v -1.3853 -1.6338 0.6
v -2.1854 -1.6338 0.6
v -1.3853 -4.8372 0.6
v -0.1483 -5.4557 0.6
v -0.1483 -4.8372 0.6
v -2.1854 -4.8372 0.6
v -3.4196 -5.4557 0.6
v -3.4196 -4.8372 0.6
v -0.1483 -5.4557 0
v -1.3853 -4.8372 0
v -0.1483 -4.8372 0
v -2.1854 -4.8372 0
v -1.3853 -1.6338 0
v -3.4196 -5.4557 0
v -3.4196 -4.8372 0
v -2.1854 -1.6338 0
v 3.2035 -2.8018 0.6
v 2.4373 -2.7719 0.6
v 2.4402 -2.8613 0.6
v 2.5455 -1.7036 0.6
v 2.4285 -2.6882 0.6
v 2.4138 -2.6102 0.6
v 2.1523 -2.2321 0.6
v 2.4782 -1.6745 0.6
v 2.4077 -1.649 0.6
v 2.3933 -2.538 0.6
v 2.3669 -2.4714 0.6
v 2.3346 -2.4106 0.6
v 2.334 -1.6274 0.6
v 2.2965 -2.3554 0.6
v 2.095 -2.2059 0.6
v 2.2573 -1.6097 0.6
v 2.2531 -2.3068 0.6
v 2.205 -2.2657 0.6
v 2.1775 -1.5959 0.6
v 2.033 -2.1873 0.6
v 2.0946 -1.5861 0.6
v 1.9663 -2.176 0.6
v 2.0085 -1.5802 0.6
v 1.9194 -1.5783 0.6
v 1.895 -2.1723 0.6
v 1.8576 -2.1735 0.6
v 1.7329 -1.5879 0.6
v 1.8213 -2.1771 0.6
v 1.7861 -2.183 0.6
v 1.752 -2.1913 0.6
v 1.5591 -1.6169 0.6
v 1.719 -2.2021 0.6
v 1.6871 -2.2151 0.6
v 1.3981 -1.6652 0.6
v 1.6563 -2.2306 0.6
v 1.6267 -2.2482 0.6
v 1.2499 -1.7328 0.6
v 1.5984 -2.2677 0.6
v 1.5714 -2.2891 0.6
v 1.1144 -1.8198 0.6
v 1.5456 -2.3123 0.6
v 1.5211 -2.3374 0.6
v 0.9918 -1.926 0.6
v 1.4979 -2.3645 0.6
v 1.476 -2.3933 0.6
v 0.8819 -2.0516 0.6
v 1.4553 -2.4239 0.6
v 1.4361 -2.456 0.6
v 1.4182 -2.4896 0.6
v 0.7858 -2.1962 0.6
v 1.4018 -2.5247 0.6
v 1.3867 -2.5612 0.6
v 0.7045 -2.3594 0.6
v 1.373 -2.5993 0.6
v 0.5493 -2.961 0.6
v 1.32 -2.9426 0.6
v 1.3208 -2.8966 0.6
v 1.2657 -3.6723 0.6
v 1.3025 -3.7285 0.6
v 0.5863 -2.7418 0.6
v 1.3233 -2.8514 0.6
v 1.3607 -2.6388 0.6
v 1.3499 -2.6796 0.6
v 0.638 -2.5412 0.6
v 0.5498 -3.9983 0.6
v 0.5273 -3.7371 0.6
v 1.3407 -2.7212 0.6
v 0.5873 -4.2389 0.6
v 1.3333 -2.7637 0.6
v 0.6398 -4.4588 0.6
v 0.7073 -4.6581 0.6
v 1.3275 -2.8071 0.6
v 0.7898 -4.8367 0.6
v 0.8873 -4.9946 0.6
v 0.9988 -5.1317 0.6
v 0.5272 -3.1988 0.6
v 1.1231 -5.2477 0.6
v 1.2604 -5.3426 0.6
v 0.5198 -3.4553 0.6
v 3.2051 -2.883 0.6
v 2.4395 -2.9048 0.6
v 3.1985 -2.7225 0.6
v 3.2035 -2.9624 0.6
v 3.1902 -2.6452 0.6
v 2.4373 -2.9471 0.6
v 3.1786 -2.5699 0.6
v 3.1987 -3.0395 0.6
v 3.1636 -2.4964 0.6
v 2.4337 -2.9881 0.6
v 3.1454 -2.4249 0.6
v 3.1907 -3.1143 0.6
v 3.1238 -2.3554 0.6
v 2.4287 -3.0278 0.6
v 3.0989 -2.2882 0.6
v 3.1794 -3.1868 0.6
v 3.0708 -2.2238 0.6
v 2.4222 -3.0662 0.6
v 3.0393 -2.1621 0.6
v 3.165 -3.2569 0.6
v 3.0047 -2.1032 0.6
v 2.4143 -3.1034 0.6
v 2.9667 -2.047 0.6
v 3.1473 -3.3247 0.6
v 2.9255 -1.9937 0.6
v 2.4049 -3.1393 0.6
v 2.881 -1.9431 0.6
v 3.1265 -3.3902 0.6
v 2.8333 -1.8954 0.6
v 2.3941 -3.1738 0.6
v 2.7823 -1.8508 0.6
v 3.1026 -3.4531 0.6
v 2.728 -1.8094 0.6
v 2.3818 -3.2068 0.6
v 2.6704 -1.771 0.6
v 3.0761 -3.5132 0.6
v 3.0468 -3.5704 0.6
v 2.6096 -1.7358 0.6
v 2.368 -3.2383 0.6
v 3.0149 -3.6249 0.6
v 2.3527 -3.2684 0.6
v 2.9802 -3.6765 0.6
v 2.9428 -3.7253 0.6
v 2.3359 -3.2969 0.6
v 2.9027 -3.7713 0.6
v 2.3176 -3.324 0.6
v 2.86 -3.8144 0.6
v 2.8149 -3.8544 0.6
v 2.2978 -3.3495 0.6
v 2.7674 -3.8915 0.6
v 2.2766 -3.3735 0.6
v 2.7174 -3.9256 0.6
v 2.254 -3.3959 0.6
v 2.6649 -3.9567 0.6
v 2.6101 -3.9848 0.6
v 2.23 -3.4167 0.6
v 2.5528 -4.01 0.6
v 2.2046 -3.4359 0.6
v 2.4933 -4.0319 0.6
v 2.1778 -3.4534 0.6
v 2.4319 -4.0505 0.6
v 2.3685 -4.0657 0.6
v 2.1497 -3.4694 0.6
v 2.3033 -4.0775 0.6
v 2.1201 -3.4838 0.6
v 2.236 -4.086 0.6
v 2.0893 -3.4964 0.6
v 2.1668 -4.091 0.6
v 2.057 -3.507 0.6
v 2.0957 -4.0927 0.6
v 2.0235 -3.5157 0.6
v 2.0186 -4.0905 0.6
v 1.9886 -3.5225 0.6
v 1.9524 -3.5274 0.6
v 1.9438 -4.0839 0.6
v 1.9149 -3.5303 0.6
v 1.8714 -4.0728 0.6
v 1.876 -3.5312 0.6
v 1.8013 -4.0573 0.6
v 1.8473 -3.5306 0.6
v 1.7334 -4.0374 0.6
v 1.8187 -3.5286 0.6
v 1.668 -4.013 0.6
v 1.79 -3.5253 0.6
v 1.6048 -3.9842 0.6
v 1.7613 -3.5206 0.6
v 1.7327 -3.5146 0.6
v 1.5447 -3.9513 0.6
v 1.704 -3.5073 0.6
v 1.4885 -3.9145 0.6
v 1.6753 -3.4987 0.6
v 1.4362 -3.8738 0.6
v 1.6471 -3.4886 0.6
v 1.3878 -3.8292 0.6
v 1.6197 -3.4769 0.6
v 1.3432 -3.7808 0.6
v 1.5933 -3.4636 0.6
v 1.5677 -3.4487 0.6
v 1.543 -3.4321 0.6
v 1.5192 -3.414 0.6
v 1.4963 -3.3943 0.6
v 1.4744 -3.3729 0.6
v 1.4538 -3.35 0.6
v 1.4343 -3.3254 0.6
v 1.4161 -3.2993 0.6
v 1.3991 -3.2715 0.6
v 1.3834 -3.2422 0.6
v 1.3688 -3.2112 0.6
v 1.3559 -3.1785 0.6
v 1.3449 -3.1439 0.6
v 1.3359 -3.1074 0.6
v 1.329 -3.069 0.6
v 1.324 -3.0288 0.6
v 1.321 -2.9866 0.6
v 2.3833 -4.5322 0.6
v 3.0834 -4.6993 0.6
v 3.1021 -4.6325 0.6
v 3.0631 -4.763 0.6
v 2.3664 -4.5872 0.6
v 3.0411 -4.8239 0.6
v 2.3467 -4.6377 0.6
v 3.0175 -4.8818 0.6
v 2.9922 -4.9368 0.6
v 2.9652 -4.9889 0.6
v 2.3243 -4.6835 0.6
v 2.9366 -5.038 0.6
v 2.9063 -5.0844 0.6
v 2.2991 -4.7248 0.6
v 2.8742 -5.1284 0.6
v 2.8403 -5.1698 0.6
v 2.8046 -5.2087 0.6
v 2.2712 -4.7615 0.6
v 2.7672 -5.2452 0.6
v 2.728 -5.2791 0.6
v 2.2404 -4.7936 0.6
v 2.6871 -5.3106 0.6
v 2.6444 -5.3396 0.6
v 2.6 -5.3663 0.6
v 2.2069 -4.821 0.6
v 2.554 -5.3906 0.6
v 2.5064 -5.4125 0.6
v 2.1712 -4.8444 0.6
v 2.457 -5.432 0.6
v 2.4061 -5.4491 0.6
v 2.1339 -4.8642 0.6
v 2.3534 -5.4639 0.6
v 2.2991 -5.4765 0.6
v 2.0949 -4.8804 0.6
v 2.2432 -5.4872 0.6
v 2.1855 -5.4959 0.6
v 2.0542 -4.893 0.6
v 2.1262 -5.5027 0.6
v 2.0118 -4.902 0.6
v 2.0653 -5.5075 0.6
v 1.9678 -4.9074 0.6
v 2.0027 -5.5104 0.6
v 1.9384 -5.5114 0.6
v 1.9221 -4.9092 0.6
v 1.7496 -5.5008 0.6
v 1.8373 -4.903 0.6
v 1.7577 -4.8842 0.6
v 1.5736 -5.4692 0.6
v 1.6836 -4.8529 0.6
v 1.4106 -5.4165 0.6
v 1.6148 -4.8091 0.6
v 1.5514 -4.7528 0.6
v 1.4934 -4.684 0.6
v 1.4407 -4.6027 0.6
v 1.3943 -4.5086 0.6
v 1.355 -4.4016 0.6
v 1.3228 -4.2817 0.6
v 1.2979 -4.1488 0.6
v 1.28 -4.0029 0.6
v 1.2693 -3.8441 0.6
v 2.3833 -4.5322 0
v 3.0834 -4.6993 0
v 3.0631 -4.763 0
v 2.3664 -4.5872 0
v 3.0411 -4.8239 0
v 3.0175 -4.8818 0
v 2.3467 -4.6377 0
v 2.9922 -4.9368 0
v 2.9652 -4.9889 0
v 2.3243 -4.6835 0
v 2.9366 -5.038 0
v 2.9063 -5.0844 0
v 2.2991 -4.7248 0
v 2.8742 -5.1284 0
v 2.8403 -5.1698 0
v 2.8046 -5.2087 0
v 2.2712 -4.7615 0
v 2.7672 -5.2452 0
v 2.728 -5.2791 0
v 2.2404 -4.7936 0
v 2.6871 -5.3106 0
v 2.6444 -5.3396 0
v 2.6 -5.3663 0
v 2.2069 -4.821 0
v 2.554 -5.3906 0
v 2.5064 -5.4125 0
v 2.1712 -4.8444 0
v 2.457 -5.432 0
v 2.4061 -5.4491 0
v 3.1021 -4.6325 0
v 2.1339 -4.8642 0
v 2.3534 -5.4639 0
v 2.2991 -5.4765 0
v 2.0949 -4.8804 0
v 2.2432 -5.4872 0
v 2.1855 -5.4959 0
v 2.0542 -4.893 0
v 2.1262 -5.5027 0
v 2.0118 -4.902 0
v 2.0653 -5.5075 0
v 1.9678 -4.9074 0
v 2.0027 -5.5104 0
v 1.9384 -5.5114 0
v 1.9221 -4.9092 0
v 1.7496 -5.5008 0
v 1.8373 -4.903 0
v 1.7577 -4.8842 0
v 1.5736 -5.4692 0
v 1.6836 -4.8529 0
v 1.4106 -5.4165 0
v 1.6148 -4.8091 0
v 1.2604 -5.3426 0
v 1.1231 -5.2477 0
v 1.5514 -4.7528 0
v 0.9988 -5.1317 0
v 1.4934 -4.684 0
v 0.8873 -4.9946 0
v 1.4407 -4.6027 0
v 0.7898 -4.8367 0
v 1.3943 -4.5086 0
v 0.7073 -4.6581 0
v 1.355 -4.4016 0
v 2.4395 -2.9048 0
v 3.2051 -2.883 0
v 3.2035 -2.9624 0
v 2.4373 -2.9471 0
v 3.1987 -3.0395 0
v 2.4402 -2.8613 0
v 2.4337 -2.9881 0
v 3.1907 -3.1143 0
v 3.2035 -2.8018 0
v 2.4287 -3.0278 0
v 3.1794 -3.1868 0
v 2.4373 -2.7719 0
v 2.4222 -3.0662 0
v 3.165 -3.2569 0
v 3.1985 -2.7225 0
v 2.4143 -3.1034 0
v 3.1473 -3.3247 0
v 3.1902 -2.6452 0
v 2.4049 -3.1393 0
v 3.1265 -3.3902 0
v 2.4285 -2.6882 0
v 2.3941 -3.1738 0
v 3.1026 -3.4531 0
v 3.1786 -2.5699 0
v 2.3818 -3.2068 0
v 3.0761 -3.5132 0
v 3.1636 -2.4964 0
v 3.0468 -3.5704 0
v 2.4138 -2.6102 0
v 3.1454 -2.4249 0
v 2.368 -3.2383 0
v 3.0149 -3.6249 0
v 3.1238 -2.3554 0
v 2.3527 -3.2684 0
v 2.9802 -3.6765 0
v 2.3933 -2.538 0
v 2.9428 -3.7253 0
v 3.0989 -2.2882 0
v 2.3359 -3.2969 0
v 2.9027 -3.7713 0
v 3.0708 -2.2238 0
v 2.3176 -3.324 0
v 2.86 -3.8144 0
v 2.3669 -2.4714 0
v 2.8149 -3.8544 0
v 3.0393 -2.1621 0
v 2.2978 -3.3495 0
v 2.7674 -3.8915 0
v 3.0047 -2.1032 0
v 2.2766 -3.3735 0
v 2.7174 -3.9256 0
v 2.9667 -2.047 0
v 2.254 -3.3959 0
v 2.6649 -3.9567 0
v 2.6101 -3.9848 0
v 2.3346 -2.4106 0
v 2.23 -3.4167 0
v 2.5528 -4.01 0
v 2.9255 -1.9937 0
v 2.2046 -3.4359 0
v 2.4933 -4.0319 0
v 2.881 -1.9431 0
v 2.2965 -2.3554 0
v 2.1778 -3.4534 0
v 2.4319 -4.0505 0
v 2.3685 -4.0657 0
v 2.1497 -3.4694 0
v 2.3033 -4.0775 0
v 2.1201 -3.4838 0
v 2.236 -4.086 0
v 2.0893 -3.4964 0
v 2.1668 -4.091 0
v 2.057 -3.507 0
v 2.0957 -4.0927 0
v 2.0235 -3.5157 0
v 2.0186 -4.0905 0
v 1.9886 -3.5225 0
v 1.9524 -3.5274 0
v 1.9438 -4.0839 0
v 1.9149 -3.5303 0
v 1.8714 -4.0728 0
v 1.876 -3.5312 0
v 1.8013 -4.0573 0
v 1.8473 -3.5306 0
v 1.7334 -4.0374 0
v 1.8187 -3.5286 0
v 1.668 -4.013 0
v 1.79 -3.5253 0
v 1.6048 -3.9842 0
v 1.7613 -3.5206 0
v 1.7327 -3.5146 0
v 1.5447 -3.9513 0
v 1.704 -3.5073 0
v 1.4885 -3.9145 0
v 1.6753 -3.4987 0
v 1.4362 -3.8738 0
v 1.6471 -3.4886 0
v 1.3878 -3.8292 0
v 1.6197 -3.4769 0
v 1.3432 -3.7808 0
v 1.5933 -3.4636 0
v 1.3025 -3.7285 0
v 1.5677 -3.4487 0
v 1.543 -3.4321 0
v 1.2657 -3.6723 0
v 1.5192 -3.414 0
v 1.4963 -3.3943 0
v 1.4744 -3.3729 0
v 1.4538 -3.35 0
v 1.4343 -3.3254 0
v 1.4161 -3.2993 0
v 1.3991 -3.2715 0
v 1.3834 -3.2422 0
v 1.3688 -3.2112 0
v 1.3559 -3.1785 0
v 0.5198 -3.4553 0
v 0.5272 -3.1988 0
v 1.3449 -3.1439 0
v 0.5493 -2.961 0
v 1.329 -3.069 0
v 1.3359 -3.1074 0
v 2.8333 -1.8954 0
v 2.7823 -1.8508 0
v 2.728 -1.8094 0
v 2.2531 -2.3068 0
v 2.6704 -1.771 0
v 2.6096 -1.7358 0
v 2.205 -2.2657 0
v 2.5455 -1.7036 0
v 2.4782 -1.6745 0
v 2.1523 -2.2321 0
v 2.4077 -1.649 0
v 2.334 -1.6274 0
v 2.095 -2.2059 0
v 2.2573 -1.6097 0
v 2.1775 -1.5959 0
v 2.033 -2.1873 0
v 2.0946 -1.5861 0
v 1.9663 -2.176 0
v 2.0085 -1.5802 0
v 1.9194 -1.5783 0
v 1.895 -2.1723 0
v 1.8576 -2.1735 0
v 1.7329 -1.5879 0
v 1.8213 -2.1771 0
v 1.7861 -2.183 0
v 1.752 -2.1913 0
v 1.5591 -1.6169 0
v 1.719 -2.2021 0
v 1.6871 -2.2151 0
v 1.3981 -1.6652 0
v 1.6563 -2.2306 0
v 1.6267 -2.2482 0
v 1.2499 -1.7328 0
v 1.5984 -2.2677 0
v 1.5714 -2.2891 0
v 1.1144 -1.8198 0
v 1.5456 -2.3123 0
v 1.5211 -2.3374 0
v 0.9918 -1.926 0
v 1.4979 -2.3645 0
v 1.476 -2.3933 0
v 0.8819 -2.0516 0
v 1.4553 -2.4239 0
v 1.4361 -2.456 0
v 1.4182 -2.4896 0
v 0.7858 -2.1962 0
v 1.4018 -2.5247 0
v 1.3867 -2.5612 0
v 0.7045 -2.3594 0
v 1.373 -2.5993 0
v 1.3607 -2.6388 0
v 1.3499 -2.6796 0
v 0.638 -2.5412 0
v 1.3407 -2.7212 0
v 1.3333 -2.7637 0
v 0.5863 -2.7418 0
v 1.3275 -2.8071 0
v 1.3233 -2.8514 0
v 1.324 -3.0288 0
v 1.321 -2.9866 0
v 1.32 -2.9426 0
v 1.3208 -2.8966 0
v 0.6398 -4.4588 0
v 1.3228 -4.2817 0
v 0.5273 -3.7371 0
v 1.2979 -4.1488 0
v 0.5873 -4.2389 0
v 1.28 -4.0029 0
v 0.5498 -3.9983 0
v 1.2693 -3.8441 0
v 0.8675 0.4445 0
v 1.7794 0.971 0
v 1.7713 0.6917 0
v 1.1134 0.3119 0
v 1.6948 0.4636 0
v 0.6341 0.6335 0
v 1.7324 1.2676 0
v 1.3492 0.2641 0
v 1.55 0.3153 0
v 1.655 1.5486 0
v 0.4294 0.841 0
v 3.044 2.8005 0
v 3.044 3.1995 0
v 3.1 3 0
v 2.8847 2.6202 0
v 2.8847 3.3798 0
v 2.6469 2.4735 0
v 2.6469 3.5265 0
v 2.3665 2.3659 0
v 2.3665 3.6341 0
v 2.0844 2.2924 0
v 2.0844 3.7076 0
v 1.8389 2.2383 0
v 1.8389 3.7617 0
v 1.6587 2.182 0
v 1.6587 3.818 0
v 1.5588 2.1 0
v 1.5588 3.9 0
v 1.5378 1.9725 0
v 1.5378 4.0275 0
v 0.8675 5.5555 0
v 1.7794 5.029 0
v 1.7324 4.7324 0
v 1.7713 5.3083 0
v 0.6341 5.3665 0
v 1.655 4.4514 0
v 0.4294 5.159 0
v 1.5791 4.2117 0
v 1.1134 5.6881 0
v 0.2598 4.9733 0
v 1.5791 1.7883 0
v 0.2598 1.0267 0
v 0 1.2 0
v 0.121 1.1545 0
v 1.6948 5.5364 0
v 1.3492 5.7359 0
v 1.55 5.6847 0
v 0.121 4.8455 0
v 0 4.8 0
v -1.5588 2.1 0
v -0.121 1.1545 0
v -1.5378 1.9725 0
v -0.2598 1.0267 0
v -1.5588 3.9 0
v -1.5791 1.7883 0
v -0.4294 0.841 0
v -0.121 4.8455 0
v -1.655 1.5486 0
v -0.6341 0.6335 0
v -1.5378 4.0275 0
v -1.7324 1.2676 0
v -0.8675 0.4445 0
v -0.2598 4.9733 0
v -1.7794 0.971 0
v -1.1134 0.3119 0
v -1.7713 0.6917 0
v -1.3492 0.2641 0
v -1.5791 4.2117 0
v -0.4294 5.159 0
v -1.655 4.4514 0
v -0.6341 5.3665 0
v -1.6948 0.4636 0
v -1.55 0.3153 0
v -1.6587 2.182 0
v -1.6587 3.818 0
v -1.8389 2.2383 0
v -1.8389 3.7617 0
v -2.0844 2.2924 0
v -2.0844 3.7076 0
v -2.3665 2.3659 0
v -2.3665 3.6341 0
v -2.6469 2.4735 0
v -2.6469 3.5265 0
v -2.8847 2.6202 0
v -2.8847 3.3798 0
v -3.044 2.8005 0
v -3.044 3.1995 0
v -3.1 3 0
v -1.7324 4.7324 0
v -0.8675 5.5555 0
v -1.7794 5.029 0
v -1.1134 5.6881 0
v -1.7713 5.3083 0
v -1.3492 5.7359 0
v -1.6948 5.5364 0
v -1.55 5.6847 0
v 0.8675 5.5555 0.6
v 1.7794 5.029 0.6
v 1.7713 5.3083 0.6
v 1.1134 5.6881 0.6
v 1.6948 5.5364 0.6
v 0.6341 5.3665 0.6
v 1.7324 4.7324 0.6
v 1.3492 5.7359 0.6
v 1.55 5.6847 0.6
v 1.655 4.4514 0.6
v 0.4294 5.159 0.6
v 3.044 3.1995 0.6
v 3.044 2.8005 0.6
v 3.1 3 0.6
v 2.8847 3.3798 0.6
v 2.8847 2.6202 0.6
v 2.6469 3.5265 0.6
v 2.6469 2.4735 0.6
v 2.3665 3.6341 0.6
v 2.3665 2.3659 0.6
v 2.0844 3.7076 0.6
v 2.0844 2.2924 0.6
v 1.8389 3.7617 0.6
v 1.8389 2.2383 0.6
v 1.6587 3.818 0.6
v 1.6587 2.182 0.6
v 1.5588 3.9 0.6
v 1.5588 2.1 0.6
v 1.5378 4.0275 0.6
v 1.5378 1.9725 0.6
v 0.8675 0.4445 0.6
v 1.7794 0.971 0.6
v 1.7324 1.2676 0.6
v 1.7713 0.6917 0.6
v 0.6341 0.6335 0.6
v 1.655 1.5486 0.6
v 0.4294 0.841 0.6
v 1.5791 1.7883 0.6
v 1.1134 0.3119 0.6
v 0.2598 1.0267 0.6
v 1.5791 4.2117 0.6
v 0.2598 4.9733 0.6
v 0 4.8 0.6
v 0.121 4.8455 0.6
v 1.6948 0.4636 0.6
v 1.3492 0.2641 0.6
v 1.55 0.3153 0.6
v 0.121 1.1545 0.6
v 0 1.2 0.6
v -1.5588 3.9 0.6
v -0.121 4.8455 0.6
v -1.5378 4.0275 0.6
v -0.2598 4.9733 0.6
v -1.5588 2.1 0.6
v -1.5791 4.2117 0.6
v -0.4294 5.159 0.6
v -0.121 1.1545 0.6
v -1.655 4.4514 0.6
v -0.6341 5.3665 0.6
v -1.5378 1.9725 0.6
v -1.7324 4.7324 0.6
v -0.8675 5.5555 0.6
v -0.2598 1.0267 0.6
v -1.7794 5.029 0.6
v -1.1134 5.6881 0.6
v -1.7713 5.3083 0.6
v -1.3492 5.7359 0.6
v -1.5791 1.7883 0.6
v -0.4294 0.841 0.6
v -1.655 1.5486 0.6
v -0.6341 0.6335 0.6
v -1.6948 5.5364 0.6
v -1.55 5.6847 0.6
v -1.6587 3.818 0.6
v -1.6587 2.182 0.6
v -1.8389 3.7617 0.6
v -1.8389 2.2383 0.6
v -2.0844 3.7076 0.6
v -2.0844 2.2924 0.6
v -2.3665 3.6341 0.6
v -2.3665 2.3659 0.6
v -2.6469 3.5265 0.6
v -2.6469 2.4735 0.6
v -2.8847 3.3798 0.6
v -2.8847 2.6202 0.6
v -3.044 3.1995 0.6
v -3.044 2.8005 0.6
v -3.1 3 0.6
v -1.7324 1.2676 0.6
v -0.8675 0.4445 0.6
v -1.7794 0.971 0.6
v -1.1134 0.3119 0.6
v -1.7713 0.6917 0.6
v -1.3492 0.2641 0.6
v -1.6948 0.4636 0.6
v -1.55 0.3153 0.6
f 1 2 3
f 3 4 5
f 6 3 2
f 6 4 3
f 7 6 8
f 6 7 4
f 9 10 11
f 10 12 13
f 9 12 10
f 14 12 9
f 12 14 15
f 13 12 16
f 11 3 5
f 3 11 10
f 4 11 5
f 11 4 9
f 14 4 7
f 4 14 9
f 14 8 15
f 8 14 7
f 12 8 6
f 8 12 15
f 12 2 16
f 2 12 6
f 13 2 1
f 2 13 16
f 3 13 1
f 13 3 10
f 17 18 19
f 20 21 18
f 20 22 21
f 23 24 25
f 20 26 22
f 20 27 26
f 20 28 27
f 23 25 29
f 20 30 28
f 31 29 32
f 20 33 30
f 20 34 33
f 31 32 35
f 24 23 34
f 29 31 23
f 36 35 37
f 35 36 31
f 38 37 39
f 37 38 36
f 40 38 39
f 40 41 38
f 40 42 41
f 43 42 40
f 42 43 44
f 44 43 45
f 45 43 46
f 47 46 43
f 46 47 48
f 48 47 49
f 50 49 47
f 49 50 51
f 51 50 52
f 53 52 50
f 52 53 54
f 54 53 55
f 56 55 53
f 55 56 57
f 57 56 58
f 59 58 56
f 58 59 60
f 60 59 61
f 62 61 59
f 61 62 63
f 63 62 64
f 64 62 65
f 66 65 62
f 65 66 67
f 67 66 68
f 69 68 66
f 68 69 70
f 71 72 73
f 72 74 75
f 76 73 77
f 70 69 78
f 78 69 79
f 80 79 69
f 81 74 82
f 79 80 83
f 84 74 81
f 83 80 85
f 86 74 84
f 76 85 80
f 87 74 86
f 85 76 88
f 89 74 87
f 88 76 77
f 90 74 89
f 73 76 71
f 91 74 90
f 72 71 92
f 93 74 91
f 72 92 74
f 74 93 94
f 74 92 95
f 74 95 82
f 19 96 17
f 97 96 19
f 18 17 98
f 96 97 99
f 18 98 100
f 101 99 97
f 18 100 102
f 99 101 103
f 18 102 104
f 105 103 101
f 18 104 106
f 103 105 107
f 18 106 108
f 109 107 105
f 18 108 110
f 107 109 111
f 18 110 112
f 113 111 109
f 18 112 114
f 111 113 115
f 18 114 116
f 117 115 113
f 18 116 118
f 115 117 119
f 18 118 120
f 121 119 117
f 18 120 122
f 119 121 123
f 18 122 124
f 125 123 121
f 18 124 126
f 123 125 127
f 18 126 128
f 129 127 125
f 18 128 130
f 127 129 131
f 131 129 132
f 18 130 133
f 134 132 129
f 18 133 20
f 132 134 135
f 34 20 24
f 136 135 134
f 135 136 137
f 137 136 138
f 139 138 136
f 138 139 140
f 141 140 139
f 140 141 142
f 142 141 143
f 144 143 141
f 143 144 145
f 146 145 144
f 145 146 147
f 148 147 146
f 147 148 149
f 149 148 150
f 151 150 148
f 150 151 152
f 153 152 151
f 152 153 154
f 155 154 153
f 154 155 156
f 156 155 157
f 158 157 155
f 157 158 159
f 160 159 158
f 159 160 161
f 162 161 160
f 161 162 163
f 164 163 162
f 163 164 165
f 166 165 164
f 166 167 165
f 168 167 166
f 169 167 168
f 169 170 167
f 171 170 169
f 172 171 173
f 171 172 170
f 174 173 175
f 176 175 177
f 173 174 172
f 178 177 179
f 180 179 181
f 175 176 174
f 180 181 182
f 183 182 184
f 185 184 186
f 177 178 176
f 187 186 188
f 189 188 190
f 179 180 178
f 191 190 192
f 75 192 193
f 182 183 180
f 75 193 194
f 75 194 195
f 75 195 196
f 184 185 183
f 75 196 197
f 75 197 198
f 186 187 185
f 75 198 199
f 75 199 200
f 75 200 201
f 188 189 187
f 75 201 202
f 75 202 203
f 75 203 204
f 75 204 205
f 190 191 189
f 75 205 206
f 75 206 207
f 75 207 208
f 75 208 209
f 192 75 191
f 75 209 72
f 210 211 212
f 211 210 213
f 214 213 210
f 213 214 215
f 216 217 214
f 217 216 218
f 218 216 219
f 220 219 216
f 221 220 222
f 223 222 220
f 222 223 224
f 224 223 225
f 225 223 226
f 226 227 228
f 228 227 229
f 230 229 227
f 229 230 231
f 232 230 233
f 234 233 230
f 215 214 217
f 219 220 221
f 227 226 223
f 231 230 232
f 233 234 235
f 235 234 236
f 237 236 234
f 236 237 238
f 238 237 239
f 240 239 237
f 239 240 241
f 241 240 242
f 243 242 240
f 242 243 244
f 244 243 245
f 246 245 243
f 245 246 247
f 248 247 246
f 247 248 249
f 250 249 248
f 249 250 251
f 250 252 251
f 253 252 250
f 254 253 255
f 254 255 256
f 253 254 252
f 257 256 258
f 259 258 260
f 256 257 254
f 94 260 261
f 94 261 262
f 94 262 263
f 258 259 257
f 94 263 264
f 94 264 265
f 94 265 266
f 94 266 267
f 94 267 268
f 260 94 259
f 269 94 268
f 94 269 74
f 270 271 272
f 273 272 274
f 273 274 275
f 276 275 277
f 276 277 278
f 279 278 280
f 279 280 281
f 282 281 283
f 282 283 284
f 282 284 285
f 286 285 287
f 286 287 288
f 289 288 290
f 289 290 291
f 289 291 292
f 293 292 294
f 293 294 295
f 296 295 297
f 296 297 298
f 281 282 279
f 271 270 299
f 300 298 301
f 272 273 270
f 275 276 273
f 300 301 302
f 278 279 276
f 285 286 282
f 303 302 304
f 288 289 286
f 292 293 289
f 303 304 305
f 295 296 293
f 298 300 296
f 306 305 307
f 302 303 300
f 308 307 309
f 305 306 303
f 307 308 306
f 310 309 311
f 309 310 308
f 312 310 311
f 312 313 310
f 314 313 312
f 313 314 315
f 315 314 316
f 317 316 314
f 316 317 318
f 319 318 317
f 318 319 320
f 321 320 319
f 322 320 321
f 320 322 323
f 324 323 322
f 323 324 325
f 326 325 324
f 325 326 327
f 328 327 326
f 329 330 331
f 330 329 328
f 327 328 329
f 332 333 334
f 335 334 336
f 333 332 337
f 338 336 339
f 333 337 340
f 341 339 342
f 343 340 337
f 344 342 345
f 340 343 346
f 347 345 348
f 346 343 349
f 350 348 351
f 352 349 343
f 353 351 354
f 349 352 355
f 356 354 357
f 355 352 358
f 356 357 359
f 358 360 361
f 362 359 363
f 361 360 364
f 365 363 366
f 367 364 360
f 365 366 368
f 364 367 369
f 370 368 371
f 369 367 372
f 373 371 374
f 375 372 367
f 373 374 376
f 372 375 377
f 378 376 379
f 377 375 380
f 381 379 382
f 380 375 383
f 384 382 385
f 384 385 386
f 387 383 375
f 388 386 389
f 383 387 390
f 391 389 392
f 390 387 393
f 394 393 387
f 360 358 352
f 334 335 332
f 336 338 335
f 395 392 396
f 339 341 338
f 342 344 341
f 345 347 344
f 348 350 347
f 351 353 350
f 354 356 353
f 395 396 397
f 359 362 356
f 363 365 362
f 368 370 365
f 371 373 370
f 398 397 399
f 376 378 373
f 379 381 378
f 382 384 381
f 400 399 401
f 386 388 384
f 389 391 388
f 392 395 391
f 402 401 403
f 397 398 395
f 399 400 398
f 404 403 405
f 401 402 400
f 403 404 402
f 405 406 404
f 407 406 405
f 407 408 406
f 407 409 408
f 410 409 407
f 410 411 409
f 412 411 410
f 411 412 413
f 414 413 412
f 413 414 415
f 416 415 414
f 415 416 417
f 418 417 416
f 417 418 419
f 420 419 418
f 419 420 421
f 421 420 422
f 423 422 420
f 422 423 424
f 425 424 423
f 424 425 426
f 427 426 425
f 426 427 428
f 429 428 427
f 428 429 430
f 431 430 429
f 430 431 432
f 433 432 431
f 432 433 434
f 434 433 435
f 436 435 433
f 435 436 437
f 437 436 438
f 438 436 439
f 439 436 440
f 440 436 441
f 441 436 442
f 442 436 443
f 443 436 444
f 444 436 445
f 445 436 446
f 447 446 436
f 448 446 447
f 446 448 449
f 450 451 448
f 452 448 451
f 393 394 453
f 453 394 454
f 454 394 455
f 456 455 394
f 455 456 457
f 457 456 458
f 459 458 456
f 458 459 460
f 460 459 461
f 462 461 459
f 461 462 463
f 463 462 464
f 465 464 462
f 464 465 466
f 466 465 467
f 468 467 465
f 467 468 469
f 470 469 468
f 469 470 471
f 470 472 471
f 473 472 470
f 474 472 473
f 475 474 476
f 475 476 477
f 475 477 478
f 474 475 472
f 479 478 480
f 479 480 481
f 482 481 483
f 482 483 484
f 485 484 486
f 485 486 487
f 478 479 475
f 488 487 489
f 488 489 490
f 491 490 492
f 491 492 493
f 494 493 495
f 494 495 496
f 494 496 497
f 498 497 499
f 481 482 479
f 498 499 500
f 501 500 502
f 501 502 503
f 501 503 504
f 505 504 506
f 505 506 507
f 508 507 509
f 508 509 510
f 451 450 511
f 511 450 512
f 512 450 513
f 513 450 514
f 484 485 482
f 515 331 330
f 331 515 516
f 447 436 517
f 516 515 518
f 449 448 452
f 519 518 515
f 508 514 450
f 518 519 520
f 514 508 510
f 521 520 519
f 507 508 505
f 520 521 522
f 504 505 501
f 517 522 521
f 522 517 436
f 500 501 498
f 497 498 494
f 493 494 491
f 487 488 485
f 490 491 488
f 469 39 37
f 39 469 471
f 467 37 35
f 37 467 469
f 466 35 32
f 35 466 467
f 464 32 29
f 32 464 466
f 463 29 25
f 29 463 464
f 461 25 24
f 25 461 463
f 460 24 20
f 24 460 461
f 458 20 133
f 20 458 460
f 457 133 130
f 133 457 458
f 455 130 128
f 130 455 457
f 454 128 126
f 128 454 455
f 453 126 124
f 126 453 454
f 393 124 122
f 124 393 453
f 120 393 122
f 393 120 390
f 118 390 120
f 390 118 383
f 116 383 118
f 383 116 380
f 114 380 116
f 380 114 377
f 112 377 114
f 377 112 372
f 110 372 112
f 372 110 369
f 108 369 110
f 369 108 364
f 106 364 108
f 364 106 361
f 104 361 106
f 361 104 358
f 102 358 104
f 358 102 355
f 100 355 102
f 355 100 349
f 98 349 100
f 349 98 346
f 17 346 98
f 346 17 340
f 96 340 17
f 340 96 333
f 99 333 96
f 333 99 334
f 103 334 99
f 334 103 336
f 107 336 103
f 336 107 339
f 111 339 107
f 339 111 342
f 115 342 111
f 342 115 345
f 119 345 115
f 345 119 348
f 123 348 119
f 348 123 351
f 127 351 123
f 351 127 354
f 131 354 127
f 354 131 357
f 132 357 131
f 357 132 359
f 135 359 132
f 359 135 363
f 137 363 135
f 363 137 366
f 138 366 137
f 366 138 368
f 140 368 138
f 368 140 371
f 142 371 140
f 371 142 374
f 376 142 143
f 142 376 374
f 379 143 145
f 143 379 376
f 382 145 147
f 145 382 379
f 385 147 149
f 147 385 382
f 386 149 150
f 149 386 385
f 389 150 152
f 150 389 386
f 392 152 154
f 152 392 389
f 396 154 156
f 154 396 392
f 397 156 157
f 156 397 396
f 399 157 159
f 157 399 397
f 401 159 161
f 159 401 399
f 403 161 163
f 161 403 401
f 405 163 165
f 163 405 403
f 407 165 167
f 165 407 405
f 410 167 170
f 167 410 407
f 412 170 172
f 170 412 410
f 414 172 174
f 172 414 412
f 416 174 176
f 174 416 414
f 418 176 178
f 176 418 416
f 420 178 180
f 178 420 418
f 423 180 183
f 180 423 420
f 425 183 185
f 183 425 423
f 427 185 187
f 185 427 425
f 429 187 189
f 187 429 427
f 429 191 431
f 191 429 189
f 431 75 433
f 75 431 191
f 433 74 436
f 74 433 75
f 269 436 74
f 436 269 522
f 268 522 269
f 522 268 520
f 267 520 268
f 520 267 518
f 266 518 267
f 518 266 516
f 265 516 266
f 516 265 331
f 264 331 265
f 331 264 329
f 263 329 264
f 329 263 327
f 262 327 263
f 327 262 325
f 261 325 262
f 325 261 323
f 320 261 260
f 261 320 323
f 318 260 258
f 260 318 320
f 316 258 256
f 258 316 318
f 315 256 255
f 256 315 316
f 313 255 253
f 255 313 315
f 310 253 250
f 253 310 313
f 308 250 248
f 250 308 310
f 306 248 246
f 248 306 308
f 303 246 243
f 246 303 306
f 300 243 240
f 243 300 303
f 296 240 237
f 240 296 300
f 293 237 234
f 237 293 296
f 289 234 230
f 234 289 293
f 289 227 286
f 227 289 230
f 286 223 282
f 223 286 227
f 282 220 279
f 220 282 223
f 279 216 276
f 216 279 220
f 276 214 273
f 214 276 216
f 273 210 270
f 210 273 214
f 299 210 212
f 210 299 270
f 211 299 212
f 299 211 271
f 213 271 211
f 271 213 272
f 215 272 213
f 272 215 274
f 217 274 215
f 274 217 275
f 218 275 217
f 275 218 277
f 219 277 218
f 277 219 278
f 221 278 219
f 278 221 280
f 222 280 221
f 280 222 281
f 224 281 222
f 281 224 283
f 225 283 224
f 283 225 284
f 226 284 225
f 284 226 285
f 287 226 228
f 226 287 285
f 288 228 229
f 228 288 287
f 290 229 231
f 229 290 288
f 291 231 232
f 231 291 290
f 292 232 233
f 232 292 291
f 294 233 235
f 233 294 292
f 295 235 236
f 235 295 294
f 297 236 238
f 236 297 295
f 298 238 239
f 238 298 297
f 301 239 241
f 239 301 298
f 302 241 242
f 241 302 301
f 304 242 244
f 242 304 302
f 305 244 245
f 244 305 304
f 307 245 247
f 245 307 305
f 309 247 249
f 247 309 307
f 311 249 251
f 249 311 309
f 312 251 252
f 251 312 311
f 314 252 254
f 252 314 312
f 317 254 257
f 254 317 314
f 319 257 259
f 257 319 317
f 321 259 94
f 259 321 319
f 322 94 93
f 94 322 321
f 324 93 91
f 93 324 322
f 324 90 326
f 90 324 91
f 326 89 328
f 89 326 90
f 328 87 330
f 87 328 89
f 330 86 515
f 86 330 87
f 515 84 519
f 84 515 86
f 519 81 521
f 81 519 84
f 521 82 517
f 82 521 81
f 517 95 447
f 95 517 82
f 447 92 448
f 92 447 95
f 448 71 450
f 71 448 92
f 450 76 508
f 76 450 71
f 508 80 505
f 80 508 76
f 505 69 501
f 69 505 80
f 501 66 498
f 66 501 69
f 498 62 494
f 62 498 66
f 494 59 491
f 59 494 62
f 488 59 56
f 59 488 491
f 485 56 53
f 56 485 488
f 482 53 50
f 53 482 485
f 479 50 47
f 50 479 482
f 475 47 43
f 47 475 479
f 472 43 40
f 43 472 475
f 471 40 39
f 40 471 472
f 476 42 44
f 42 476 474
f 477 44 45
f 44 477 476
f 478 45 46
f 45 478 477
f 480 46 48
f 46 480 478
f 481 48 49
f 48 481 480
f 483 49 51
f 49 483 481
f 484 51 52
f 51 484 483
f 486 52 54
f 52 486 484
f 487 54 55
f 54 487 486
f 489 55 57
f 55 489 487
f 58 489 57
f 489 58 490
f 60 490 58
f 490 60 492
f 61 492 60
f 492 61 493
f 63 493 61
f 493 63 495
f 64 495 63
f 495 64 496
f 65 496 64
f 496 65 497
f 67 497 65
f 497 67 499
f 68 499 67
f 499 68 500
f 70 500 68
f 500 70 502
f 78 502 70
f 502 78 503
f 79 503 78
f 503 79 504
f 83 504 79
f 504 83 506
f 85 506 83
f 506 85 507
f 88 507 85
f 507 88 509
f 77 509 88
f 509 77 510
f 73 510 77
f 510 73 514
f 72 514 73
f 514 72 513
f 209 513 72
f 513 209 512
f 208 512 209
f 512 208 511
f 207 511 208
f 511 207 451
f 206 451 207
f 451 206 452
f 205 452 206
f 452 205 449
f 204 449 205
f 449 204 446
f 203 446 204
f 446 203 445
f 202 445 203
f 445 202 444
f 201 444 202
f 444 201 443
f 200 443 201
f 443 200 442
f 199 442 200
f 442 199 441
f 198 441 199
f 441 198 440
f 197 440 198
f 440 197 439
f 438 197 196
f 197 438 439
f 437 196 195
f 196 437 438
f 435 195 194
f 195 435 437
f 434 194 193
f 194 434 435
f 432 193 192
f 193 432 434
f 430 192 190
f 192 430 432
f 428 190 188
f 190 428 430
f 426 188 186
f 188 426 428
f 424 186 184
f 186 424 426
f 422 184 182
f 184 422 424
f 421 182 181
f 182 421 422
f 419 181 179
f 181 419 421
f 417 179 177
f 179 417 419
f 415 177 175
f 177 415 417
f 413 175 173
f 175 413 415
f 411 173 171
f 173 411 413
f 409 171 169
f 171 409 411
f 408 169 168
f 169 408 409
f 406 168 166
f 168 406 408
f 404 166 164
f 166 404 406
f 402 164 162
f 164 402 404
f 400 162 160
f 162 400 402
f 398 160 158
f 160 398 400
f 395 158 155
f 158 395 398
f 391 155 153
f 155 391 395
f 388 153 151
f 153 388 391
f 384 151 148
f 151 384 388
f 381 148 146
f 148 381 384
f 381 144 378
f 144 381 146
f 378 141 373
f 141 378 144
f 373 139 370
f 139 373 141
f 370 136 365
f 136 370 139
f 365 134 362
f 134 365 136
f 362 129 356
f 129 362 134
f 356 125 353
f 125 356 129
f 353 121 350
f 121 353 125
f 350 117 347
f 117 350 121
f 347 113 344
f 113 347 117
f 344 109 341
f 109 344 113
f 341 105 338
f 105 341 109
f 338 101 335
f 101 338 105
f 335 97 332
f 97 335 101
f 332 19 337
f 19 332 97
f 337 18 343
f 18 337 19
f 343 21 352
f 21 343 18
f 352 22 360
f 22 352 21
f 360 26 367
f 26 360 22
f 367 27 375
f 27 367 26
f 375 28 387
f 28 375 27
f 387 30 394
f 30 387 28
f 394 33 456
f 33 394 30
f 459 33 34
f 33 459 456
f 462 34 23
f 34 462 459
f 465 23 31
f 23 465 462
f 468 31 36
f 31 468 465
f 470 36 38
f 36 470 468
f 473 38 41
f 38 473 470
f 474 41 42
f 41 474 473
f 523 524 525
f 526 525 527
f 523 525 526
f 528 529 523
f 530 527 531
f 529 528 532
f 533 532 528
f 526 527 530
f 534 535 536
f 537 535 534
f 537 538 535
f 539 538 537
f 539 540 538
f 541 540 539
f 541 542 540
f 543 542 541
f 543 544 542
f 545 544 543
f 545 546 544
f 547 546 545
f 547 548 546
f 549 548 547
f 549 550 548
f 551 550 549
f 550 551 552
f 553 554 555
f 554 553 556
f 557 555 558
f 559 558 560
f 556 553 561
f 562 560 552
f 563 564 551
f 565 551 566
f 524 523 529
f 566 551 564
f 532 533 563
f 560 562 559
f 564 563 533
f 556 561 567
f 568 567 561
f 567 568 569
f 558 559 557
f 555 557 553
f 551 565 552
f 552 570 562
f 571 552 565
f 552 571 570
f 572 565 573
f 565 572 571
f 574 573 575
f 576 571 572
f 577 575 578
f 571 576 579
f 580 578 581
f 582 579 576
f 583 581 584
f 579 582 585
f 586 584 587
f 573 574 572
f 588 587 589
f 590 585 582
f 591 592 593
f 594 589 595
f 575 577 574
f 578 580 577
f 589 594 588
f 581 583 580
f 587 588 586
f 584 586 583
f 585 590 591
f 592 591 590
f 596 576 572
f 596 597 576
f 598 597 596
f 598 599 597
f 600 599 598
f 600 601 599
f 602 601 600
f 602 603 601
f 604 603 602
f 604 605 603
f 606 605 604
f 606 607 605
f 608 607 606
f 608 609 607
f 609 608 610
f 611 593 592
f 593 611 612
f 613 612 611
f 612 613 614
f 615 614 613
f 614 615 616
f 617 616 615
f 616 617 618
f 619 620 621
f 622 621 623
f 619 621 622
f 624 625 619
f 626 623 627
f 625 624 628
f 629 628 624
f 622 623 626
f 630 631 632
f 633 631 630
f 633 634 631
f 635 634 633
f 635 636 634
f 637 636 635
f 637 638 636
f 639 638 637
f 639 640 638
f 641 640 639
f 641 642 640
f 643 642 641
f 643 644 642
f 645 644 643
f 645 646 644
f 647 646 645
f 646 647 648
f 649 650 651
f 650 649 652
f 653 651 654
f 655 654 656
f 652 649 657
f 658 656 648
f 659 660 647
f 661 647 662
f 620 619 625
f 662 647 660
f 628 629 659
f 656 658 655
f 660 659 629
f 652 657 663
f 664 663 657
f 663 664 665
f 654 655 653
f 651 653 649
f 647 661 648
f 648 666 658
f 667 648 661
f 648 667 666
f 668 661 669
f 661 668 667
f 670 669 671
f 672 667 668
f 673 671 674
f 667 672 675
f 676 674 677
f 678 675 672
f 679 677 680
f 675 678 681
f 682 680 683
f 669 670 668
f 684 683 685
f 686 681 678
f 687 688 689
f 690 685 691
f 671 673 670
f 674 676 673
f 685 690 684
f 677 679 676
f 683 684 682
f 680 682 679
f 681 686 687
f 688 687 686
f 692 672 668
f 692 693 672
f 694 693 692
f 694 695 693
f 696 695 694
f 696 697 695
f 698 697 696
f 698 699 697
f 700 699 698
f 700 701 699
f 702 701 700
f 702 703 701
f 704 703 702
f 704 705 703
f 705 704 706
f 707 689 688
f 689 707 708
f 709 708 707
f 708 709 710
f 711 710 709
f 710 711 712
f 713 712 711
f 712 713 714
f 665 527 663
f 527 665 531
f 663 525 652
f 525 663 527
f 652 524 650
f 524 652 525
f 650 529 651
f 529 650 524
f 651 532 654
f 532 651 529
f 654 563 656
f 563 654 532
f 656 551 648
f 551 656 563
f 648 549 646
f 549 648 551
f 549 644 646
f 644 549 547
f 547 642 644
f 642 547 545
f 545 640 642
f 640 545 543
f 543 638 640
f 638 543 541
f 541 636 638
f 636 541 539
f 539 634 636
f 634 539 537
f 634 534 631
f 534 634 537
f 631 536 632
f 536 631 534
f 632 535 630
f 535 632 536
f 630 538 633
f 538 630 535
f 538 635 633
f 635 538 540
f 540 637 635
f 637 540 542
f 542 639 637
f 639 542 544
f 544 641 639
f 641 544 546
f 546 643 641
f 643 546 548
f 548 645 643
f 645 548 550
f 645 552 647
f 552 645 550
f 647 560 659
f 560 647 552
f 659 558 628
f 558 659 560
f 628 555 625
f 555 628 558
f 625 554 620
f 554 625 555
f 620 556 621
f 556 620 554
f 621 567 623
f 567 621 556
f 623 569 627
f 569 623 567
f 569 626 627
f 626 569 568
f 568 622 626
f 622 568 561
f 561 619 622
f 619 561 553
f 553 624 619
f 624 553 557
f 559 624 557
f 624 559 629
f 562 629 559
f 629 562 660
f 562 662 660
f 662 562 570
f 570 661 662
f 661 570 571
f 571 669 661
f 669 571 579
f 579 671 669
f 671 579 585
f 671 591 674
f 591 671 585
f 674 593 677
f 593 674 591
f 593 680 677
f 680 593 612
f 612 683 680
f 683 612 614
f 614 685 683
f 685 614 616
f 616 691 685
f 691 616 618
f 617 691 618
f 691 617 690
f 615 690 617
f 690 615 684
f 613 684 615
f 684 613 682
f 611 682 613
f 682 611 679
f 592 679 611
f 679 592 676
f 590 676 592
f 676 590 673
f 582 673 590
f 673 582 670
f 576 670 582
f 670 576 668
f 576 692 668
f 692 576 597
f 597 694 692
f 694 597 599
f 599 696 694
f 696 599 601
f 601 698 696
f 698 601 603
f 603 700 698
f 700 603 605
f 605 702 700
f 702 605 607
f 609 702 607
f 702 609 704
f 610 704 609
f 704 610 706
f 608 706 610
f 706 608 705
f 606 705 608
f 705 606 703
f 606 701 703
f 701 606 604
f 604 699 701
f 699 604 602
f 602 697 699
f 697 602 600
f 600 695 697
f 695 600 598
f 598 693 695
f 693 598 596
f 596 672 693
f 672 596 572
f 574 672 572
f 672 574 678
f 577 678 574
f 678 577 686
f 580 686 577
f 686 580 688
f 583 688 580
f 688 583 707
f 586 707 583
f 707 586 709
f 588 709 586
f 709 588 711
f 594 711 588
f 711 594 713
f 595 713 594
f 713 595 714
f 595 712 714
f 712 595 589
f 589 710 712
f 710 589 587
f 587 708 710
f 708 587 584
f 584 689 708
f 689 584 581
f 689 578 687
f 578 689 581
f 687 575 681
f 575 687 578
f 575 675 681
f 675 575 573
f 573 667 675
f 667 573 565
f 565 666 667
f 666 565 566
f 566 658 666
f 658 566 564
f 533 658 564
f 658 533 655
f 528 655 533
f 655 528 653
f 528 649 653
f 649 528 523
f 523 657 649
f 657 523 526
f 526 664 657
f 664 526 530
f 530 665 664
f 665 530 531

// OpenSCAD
$fn = 50;

difference() {
	union() {
		translate(v = [-1.825, -3.5, 0.6]) {
			rotate(a = [180, 0, 0]) {
				linear_extrude(height = 0.6) {
					text(font = "Liberation Sans:style=Bold", halign = "center", size = 4.0, text = "T", valign = "center");
				}
			}
		}
		translate(v = [1.825, -3.5, 0.6]) {
			rotate(a = [180, 0, 0]) {
				linear_extrude(height = 0.6) {
					text(font = "Liberation Sans:style=Bold", halign = "center", size = 4.0, text = "6", valign = "center");
				}
			}
		}
		translate(v = [0, 3, 0]) {
			linear_extrude(height = 0.6) {
				polygon(points = [[3.1, 0.0], [3.0439902950186117, 0.1995136647114984], [2.8847272103883213, 0.3797815421059436], [2.646888617374527, 0.5264988810722369], [2.3665182744082176, 0.6341066605011758], [2.0844354103556904, 0.7075704773708675], [1.8388718910678303, 0.761685676746956], [1.658746676795018, 0.818003336606089], [1.55884572681199, 0.9], [1.5377850082788151, 1.0275150922444565], [1.5790750912955211, 1.211666933596394], [1.6549917135488983, 1.4513887792304347], [1.7324116139070416, 1.7324116139070416], [1.779405714759903, 2.0290233430980913], [1.7712640685463372, 2.3083562761315313], [1.6947790495515949, 2.5364160920036563], [1.5500000000000005, 2.68467875173176], [1.3492112454670173, 2.735929756715155], [1.1134631418419842, 2.688137818237475], [0.8674829026146248, 2.555522224170328], [0.6341066605011758, 2.3665182744082176], [0.42944369680679173, 2.1589592566013023], [0.2597967997723095, 1.9733526103433505], [0.120961668516203, 1.8455184288505457], [1.102182119232618e-16, 1.8000000000000003], [-0.12096166851620277, 1.8455184288505457], [-0.25979679977230924, 1.9733526103433503], [-0.42944369680679134, 2.158959256601302], [-0.6341066605011755, 2.366518274408217], [-0.8674829026146244, 2.555522224170328], [-1.1134631418419831, 2.688137818237475], [-1.3492112454670169, 2.735929756715155], [-1.5499999999999994, 2.68467875173176], [-1.6947790495515944, 2.536416092003656], [-1.7712640685463372, 2.3083562761315313], [-1.7794057147599032, 2.0290233430980913], [-1.7324116139070418, 1.732411613907042], [-1.6549917135488983, 1.4513887792304352], [-1.5790750912955214, 1.211666933596395], [-1.5377850082788156, 1.0275150922444576], [-1.55884572681199, 0.9], [-1.6587466767950174, 0.8180033366060897], [-1.8388718910678303, 0.7616856767469562], [-2.084435410355689, 0.7075704773708675], [-2.3665182744082154, 0.634106660501176], [-2.646888617374527, 0.5264988810722366], [-2.8847272103883204, 0.37978154210594467], [-3.0439902950186117, 0.1995136647114986], [-3.1, 3.796405077356795e-16], [-3.043990295018612, -0.19951366471149784], [-2.8847272103883213, -0.37978154210594417], [-2.646888617374528, -0.5264988810722362], [-2.366518274408217, -0.6341066605011759], [-2.0844354103556904, -0.7075704773708673], [-1.8388718910678312, -0.7616856767469561], [-1.6587466767950179, -0.8180033366060894], [-1.5588457268119902, -0.8999999999999996], [-1.5377850082788154, -1.0275150922444558], [-1.5790750912955211, -1.211666933596394], [-1.6549917135488978, -1.4513887792304343], [-1.7324116139070413, -1.7324116139070393], [-1.7794057147599032, -2.0290233430980904], [-1.7712640685463374, -2.30835627613153], [-1.6947790495515942, -2.5364160920036567], [-1.5500000000000014, -2.6846787517317594], [-1.349211245467018, -2.7359297567151555], [-1.1134631418419827, -2.688137818237474], [-0.8674829026146252, -2.5555222241703284], [-0.6341066605011755, -2.366518274408217], [-0.42944369680679256, -2.1589592566013027], [-0.2597967997723094, -1.973352610343351], [-0.12096166851620195, -1.8455184288505448], [-3.3065463576978537e-16, -1.8000000000000003], [0.12096166851620122, -1.8455184288505442], [0.2597967997723086, -1.9733526103433503], [0.4294436968067915, -2.1589592566013014], [0.6341066605011743, -2.3665182744082163], [0.8674829026146239, -2.5555222241703275], [1.1134631418419814, -2.688137818237473], [1.3492112454670167, -2.735929756715155], [1.5500000000000005, -2.68467875173176], [1.6947790495515938, -2.536416092003658], [1.7712640685463361, -2.3083562761315344], [1.7794057147599027, -2.0290233430980895], [1.732411613907041, -1.7324116139070416], [1.6549917135488992, -1.451388779230435], [1.5790750912955214, -1.2116669335963952], [1.5377850082788151, -1.0275150922444585], [1.5588457268119893, -0.9000000000000009], [1.658746676795018, -0.8180033366060894], [1.8388718910678303, -0.7616856767469555], [2.084435410355689, -0.7075704773708676], [2.366518274408215, -0.6341066605011774], [2.646888617374524, -0.5264988810722376], [2.8847272103883217, -0.37978154210594395], [3.0439902950186117, -0.1995136647114976]]);
			}
		}
	}
	union();
}
